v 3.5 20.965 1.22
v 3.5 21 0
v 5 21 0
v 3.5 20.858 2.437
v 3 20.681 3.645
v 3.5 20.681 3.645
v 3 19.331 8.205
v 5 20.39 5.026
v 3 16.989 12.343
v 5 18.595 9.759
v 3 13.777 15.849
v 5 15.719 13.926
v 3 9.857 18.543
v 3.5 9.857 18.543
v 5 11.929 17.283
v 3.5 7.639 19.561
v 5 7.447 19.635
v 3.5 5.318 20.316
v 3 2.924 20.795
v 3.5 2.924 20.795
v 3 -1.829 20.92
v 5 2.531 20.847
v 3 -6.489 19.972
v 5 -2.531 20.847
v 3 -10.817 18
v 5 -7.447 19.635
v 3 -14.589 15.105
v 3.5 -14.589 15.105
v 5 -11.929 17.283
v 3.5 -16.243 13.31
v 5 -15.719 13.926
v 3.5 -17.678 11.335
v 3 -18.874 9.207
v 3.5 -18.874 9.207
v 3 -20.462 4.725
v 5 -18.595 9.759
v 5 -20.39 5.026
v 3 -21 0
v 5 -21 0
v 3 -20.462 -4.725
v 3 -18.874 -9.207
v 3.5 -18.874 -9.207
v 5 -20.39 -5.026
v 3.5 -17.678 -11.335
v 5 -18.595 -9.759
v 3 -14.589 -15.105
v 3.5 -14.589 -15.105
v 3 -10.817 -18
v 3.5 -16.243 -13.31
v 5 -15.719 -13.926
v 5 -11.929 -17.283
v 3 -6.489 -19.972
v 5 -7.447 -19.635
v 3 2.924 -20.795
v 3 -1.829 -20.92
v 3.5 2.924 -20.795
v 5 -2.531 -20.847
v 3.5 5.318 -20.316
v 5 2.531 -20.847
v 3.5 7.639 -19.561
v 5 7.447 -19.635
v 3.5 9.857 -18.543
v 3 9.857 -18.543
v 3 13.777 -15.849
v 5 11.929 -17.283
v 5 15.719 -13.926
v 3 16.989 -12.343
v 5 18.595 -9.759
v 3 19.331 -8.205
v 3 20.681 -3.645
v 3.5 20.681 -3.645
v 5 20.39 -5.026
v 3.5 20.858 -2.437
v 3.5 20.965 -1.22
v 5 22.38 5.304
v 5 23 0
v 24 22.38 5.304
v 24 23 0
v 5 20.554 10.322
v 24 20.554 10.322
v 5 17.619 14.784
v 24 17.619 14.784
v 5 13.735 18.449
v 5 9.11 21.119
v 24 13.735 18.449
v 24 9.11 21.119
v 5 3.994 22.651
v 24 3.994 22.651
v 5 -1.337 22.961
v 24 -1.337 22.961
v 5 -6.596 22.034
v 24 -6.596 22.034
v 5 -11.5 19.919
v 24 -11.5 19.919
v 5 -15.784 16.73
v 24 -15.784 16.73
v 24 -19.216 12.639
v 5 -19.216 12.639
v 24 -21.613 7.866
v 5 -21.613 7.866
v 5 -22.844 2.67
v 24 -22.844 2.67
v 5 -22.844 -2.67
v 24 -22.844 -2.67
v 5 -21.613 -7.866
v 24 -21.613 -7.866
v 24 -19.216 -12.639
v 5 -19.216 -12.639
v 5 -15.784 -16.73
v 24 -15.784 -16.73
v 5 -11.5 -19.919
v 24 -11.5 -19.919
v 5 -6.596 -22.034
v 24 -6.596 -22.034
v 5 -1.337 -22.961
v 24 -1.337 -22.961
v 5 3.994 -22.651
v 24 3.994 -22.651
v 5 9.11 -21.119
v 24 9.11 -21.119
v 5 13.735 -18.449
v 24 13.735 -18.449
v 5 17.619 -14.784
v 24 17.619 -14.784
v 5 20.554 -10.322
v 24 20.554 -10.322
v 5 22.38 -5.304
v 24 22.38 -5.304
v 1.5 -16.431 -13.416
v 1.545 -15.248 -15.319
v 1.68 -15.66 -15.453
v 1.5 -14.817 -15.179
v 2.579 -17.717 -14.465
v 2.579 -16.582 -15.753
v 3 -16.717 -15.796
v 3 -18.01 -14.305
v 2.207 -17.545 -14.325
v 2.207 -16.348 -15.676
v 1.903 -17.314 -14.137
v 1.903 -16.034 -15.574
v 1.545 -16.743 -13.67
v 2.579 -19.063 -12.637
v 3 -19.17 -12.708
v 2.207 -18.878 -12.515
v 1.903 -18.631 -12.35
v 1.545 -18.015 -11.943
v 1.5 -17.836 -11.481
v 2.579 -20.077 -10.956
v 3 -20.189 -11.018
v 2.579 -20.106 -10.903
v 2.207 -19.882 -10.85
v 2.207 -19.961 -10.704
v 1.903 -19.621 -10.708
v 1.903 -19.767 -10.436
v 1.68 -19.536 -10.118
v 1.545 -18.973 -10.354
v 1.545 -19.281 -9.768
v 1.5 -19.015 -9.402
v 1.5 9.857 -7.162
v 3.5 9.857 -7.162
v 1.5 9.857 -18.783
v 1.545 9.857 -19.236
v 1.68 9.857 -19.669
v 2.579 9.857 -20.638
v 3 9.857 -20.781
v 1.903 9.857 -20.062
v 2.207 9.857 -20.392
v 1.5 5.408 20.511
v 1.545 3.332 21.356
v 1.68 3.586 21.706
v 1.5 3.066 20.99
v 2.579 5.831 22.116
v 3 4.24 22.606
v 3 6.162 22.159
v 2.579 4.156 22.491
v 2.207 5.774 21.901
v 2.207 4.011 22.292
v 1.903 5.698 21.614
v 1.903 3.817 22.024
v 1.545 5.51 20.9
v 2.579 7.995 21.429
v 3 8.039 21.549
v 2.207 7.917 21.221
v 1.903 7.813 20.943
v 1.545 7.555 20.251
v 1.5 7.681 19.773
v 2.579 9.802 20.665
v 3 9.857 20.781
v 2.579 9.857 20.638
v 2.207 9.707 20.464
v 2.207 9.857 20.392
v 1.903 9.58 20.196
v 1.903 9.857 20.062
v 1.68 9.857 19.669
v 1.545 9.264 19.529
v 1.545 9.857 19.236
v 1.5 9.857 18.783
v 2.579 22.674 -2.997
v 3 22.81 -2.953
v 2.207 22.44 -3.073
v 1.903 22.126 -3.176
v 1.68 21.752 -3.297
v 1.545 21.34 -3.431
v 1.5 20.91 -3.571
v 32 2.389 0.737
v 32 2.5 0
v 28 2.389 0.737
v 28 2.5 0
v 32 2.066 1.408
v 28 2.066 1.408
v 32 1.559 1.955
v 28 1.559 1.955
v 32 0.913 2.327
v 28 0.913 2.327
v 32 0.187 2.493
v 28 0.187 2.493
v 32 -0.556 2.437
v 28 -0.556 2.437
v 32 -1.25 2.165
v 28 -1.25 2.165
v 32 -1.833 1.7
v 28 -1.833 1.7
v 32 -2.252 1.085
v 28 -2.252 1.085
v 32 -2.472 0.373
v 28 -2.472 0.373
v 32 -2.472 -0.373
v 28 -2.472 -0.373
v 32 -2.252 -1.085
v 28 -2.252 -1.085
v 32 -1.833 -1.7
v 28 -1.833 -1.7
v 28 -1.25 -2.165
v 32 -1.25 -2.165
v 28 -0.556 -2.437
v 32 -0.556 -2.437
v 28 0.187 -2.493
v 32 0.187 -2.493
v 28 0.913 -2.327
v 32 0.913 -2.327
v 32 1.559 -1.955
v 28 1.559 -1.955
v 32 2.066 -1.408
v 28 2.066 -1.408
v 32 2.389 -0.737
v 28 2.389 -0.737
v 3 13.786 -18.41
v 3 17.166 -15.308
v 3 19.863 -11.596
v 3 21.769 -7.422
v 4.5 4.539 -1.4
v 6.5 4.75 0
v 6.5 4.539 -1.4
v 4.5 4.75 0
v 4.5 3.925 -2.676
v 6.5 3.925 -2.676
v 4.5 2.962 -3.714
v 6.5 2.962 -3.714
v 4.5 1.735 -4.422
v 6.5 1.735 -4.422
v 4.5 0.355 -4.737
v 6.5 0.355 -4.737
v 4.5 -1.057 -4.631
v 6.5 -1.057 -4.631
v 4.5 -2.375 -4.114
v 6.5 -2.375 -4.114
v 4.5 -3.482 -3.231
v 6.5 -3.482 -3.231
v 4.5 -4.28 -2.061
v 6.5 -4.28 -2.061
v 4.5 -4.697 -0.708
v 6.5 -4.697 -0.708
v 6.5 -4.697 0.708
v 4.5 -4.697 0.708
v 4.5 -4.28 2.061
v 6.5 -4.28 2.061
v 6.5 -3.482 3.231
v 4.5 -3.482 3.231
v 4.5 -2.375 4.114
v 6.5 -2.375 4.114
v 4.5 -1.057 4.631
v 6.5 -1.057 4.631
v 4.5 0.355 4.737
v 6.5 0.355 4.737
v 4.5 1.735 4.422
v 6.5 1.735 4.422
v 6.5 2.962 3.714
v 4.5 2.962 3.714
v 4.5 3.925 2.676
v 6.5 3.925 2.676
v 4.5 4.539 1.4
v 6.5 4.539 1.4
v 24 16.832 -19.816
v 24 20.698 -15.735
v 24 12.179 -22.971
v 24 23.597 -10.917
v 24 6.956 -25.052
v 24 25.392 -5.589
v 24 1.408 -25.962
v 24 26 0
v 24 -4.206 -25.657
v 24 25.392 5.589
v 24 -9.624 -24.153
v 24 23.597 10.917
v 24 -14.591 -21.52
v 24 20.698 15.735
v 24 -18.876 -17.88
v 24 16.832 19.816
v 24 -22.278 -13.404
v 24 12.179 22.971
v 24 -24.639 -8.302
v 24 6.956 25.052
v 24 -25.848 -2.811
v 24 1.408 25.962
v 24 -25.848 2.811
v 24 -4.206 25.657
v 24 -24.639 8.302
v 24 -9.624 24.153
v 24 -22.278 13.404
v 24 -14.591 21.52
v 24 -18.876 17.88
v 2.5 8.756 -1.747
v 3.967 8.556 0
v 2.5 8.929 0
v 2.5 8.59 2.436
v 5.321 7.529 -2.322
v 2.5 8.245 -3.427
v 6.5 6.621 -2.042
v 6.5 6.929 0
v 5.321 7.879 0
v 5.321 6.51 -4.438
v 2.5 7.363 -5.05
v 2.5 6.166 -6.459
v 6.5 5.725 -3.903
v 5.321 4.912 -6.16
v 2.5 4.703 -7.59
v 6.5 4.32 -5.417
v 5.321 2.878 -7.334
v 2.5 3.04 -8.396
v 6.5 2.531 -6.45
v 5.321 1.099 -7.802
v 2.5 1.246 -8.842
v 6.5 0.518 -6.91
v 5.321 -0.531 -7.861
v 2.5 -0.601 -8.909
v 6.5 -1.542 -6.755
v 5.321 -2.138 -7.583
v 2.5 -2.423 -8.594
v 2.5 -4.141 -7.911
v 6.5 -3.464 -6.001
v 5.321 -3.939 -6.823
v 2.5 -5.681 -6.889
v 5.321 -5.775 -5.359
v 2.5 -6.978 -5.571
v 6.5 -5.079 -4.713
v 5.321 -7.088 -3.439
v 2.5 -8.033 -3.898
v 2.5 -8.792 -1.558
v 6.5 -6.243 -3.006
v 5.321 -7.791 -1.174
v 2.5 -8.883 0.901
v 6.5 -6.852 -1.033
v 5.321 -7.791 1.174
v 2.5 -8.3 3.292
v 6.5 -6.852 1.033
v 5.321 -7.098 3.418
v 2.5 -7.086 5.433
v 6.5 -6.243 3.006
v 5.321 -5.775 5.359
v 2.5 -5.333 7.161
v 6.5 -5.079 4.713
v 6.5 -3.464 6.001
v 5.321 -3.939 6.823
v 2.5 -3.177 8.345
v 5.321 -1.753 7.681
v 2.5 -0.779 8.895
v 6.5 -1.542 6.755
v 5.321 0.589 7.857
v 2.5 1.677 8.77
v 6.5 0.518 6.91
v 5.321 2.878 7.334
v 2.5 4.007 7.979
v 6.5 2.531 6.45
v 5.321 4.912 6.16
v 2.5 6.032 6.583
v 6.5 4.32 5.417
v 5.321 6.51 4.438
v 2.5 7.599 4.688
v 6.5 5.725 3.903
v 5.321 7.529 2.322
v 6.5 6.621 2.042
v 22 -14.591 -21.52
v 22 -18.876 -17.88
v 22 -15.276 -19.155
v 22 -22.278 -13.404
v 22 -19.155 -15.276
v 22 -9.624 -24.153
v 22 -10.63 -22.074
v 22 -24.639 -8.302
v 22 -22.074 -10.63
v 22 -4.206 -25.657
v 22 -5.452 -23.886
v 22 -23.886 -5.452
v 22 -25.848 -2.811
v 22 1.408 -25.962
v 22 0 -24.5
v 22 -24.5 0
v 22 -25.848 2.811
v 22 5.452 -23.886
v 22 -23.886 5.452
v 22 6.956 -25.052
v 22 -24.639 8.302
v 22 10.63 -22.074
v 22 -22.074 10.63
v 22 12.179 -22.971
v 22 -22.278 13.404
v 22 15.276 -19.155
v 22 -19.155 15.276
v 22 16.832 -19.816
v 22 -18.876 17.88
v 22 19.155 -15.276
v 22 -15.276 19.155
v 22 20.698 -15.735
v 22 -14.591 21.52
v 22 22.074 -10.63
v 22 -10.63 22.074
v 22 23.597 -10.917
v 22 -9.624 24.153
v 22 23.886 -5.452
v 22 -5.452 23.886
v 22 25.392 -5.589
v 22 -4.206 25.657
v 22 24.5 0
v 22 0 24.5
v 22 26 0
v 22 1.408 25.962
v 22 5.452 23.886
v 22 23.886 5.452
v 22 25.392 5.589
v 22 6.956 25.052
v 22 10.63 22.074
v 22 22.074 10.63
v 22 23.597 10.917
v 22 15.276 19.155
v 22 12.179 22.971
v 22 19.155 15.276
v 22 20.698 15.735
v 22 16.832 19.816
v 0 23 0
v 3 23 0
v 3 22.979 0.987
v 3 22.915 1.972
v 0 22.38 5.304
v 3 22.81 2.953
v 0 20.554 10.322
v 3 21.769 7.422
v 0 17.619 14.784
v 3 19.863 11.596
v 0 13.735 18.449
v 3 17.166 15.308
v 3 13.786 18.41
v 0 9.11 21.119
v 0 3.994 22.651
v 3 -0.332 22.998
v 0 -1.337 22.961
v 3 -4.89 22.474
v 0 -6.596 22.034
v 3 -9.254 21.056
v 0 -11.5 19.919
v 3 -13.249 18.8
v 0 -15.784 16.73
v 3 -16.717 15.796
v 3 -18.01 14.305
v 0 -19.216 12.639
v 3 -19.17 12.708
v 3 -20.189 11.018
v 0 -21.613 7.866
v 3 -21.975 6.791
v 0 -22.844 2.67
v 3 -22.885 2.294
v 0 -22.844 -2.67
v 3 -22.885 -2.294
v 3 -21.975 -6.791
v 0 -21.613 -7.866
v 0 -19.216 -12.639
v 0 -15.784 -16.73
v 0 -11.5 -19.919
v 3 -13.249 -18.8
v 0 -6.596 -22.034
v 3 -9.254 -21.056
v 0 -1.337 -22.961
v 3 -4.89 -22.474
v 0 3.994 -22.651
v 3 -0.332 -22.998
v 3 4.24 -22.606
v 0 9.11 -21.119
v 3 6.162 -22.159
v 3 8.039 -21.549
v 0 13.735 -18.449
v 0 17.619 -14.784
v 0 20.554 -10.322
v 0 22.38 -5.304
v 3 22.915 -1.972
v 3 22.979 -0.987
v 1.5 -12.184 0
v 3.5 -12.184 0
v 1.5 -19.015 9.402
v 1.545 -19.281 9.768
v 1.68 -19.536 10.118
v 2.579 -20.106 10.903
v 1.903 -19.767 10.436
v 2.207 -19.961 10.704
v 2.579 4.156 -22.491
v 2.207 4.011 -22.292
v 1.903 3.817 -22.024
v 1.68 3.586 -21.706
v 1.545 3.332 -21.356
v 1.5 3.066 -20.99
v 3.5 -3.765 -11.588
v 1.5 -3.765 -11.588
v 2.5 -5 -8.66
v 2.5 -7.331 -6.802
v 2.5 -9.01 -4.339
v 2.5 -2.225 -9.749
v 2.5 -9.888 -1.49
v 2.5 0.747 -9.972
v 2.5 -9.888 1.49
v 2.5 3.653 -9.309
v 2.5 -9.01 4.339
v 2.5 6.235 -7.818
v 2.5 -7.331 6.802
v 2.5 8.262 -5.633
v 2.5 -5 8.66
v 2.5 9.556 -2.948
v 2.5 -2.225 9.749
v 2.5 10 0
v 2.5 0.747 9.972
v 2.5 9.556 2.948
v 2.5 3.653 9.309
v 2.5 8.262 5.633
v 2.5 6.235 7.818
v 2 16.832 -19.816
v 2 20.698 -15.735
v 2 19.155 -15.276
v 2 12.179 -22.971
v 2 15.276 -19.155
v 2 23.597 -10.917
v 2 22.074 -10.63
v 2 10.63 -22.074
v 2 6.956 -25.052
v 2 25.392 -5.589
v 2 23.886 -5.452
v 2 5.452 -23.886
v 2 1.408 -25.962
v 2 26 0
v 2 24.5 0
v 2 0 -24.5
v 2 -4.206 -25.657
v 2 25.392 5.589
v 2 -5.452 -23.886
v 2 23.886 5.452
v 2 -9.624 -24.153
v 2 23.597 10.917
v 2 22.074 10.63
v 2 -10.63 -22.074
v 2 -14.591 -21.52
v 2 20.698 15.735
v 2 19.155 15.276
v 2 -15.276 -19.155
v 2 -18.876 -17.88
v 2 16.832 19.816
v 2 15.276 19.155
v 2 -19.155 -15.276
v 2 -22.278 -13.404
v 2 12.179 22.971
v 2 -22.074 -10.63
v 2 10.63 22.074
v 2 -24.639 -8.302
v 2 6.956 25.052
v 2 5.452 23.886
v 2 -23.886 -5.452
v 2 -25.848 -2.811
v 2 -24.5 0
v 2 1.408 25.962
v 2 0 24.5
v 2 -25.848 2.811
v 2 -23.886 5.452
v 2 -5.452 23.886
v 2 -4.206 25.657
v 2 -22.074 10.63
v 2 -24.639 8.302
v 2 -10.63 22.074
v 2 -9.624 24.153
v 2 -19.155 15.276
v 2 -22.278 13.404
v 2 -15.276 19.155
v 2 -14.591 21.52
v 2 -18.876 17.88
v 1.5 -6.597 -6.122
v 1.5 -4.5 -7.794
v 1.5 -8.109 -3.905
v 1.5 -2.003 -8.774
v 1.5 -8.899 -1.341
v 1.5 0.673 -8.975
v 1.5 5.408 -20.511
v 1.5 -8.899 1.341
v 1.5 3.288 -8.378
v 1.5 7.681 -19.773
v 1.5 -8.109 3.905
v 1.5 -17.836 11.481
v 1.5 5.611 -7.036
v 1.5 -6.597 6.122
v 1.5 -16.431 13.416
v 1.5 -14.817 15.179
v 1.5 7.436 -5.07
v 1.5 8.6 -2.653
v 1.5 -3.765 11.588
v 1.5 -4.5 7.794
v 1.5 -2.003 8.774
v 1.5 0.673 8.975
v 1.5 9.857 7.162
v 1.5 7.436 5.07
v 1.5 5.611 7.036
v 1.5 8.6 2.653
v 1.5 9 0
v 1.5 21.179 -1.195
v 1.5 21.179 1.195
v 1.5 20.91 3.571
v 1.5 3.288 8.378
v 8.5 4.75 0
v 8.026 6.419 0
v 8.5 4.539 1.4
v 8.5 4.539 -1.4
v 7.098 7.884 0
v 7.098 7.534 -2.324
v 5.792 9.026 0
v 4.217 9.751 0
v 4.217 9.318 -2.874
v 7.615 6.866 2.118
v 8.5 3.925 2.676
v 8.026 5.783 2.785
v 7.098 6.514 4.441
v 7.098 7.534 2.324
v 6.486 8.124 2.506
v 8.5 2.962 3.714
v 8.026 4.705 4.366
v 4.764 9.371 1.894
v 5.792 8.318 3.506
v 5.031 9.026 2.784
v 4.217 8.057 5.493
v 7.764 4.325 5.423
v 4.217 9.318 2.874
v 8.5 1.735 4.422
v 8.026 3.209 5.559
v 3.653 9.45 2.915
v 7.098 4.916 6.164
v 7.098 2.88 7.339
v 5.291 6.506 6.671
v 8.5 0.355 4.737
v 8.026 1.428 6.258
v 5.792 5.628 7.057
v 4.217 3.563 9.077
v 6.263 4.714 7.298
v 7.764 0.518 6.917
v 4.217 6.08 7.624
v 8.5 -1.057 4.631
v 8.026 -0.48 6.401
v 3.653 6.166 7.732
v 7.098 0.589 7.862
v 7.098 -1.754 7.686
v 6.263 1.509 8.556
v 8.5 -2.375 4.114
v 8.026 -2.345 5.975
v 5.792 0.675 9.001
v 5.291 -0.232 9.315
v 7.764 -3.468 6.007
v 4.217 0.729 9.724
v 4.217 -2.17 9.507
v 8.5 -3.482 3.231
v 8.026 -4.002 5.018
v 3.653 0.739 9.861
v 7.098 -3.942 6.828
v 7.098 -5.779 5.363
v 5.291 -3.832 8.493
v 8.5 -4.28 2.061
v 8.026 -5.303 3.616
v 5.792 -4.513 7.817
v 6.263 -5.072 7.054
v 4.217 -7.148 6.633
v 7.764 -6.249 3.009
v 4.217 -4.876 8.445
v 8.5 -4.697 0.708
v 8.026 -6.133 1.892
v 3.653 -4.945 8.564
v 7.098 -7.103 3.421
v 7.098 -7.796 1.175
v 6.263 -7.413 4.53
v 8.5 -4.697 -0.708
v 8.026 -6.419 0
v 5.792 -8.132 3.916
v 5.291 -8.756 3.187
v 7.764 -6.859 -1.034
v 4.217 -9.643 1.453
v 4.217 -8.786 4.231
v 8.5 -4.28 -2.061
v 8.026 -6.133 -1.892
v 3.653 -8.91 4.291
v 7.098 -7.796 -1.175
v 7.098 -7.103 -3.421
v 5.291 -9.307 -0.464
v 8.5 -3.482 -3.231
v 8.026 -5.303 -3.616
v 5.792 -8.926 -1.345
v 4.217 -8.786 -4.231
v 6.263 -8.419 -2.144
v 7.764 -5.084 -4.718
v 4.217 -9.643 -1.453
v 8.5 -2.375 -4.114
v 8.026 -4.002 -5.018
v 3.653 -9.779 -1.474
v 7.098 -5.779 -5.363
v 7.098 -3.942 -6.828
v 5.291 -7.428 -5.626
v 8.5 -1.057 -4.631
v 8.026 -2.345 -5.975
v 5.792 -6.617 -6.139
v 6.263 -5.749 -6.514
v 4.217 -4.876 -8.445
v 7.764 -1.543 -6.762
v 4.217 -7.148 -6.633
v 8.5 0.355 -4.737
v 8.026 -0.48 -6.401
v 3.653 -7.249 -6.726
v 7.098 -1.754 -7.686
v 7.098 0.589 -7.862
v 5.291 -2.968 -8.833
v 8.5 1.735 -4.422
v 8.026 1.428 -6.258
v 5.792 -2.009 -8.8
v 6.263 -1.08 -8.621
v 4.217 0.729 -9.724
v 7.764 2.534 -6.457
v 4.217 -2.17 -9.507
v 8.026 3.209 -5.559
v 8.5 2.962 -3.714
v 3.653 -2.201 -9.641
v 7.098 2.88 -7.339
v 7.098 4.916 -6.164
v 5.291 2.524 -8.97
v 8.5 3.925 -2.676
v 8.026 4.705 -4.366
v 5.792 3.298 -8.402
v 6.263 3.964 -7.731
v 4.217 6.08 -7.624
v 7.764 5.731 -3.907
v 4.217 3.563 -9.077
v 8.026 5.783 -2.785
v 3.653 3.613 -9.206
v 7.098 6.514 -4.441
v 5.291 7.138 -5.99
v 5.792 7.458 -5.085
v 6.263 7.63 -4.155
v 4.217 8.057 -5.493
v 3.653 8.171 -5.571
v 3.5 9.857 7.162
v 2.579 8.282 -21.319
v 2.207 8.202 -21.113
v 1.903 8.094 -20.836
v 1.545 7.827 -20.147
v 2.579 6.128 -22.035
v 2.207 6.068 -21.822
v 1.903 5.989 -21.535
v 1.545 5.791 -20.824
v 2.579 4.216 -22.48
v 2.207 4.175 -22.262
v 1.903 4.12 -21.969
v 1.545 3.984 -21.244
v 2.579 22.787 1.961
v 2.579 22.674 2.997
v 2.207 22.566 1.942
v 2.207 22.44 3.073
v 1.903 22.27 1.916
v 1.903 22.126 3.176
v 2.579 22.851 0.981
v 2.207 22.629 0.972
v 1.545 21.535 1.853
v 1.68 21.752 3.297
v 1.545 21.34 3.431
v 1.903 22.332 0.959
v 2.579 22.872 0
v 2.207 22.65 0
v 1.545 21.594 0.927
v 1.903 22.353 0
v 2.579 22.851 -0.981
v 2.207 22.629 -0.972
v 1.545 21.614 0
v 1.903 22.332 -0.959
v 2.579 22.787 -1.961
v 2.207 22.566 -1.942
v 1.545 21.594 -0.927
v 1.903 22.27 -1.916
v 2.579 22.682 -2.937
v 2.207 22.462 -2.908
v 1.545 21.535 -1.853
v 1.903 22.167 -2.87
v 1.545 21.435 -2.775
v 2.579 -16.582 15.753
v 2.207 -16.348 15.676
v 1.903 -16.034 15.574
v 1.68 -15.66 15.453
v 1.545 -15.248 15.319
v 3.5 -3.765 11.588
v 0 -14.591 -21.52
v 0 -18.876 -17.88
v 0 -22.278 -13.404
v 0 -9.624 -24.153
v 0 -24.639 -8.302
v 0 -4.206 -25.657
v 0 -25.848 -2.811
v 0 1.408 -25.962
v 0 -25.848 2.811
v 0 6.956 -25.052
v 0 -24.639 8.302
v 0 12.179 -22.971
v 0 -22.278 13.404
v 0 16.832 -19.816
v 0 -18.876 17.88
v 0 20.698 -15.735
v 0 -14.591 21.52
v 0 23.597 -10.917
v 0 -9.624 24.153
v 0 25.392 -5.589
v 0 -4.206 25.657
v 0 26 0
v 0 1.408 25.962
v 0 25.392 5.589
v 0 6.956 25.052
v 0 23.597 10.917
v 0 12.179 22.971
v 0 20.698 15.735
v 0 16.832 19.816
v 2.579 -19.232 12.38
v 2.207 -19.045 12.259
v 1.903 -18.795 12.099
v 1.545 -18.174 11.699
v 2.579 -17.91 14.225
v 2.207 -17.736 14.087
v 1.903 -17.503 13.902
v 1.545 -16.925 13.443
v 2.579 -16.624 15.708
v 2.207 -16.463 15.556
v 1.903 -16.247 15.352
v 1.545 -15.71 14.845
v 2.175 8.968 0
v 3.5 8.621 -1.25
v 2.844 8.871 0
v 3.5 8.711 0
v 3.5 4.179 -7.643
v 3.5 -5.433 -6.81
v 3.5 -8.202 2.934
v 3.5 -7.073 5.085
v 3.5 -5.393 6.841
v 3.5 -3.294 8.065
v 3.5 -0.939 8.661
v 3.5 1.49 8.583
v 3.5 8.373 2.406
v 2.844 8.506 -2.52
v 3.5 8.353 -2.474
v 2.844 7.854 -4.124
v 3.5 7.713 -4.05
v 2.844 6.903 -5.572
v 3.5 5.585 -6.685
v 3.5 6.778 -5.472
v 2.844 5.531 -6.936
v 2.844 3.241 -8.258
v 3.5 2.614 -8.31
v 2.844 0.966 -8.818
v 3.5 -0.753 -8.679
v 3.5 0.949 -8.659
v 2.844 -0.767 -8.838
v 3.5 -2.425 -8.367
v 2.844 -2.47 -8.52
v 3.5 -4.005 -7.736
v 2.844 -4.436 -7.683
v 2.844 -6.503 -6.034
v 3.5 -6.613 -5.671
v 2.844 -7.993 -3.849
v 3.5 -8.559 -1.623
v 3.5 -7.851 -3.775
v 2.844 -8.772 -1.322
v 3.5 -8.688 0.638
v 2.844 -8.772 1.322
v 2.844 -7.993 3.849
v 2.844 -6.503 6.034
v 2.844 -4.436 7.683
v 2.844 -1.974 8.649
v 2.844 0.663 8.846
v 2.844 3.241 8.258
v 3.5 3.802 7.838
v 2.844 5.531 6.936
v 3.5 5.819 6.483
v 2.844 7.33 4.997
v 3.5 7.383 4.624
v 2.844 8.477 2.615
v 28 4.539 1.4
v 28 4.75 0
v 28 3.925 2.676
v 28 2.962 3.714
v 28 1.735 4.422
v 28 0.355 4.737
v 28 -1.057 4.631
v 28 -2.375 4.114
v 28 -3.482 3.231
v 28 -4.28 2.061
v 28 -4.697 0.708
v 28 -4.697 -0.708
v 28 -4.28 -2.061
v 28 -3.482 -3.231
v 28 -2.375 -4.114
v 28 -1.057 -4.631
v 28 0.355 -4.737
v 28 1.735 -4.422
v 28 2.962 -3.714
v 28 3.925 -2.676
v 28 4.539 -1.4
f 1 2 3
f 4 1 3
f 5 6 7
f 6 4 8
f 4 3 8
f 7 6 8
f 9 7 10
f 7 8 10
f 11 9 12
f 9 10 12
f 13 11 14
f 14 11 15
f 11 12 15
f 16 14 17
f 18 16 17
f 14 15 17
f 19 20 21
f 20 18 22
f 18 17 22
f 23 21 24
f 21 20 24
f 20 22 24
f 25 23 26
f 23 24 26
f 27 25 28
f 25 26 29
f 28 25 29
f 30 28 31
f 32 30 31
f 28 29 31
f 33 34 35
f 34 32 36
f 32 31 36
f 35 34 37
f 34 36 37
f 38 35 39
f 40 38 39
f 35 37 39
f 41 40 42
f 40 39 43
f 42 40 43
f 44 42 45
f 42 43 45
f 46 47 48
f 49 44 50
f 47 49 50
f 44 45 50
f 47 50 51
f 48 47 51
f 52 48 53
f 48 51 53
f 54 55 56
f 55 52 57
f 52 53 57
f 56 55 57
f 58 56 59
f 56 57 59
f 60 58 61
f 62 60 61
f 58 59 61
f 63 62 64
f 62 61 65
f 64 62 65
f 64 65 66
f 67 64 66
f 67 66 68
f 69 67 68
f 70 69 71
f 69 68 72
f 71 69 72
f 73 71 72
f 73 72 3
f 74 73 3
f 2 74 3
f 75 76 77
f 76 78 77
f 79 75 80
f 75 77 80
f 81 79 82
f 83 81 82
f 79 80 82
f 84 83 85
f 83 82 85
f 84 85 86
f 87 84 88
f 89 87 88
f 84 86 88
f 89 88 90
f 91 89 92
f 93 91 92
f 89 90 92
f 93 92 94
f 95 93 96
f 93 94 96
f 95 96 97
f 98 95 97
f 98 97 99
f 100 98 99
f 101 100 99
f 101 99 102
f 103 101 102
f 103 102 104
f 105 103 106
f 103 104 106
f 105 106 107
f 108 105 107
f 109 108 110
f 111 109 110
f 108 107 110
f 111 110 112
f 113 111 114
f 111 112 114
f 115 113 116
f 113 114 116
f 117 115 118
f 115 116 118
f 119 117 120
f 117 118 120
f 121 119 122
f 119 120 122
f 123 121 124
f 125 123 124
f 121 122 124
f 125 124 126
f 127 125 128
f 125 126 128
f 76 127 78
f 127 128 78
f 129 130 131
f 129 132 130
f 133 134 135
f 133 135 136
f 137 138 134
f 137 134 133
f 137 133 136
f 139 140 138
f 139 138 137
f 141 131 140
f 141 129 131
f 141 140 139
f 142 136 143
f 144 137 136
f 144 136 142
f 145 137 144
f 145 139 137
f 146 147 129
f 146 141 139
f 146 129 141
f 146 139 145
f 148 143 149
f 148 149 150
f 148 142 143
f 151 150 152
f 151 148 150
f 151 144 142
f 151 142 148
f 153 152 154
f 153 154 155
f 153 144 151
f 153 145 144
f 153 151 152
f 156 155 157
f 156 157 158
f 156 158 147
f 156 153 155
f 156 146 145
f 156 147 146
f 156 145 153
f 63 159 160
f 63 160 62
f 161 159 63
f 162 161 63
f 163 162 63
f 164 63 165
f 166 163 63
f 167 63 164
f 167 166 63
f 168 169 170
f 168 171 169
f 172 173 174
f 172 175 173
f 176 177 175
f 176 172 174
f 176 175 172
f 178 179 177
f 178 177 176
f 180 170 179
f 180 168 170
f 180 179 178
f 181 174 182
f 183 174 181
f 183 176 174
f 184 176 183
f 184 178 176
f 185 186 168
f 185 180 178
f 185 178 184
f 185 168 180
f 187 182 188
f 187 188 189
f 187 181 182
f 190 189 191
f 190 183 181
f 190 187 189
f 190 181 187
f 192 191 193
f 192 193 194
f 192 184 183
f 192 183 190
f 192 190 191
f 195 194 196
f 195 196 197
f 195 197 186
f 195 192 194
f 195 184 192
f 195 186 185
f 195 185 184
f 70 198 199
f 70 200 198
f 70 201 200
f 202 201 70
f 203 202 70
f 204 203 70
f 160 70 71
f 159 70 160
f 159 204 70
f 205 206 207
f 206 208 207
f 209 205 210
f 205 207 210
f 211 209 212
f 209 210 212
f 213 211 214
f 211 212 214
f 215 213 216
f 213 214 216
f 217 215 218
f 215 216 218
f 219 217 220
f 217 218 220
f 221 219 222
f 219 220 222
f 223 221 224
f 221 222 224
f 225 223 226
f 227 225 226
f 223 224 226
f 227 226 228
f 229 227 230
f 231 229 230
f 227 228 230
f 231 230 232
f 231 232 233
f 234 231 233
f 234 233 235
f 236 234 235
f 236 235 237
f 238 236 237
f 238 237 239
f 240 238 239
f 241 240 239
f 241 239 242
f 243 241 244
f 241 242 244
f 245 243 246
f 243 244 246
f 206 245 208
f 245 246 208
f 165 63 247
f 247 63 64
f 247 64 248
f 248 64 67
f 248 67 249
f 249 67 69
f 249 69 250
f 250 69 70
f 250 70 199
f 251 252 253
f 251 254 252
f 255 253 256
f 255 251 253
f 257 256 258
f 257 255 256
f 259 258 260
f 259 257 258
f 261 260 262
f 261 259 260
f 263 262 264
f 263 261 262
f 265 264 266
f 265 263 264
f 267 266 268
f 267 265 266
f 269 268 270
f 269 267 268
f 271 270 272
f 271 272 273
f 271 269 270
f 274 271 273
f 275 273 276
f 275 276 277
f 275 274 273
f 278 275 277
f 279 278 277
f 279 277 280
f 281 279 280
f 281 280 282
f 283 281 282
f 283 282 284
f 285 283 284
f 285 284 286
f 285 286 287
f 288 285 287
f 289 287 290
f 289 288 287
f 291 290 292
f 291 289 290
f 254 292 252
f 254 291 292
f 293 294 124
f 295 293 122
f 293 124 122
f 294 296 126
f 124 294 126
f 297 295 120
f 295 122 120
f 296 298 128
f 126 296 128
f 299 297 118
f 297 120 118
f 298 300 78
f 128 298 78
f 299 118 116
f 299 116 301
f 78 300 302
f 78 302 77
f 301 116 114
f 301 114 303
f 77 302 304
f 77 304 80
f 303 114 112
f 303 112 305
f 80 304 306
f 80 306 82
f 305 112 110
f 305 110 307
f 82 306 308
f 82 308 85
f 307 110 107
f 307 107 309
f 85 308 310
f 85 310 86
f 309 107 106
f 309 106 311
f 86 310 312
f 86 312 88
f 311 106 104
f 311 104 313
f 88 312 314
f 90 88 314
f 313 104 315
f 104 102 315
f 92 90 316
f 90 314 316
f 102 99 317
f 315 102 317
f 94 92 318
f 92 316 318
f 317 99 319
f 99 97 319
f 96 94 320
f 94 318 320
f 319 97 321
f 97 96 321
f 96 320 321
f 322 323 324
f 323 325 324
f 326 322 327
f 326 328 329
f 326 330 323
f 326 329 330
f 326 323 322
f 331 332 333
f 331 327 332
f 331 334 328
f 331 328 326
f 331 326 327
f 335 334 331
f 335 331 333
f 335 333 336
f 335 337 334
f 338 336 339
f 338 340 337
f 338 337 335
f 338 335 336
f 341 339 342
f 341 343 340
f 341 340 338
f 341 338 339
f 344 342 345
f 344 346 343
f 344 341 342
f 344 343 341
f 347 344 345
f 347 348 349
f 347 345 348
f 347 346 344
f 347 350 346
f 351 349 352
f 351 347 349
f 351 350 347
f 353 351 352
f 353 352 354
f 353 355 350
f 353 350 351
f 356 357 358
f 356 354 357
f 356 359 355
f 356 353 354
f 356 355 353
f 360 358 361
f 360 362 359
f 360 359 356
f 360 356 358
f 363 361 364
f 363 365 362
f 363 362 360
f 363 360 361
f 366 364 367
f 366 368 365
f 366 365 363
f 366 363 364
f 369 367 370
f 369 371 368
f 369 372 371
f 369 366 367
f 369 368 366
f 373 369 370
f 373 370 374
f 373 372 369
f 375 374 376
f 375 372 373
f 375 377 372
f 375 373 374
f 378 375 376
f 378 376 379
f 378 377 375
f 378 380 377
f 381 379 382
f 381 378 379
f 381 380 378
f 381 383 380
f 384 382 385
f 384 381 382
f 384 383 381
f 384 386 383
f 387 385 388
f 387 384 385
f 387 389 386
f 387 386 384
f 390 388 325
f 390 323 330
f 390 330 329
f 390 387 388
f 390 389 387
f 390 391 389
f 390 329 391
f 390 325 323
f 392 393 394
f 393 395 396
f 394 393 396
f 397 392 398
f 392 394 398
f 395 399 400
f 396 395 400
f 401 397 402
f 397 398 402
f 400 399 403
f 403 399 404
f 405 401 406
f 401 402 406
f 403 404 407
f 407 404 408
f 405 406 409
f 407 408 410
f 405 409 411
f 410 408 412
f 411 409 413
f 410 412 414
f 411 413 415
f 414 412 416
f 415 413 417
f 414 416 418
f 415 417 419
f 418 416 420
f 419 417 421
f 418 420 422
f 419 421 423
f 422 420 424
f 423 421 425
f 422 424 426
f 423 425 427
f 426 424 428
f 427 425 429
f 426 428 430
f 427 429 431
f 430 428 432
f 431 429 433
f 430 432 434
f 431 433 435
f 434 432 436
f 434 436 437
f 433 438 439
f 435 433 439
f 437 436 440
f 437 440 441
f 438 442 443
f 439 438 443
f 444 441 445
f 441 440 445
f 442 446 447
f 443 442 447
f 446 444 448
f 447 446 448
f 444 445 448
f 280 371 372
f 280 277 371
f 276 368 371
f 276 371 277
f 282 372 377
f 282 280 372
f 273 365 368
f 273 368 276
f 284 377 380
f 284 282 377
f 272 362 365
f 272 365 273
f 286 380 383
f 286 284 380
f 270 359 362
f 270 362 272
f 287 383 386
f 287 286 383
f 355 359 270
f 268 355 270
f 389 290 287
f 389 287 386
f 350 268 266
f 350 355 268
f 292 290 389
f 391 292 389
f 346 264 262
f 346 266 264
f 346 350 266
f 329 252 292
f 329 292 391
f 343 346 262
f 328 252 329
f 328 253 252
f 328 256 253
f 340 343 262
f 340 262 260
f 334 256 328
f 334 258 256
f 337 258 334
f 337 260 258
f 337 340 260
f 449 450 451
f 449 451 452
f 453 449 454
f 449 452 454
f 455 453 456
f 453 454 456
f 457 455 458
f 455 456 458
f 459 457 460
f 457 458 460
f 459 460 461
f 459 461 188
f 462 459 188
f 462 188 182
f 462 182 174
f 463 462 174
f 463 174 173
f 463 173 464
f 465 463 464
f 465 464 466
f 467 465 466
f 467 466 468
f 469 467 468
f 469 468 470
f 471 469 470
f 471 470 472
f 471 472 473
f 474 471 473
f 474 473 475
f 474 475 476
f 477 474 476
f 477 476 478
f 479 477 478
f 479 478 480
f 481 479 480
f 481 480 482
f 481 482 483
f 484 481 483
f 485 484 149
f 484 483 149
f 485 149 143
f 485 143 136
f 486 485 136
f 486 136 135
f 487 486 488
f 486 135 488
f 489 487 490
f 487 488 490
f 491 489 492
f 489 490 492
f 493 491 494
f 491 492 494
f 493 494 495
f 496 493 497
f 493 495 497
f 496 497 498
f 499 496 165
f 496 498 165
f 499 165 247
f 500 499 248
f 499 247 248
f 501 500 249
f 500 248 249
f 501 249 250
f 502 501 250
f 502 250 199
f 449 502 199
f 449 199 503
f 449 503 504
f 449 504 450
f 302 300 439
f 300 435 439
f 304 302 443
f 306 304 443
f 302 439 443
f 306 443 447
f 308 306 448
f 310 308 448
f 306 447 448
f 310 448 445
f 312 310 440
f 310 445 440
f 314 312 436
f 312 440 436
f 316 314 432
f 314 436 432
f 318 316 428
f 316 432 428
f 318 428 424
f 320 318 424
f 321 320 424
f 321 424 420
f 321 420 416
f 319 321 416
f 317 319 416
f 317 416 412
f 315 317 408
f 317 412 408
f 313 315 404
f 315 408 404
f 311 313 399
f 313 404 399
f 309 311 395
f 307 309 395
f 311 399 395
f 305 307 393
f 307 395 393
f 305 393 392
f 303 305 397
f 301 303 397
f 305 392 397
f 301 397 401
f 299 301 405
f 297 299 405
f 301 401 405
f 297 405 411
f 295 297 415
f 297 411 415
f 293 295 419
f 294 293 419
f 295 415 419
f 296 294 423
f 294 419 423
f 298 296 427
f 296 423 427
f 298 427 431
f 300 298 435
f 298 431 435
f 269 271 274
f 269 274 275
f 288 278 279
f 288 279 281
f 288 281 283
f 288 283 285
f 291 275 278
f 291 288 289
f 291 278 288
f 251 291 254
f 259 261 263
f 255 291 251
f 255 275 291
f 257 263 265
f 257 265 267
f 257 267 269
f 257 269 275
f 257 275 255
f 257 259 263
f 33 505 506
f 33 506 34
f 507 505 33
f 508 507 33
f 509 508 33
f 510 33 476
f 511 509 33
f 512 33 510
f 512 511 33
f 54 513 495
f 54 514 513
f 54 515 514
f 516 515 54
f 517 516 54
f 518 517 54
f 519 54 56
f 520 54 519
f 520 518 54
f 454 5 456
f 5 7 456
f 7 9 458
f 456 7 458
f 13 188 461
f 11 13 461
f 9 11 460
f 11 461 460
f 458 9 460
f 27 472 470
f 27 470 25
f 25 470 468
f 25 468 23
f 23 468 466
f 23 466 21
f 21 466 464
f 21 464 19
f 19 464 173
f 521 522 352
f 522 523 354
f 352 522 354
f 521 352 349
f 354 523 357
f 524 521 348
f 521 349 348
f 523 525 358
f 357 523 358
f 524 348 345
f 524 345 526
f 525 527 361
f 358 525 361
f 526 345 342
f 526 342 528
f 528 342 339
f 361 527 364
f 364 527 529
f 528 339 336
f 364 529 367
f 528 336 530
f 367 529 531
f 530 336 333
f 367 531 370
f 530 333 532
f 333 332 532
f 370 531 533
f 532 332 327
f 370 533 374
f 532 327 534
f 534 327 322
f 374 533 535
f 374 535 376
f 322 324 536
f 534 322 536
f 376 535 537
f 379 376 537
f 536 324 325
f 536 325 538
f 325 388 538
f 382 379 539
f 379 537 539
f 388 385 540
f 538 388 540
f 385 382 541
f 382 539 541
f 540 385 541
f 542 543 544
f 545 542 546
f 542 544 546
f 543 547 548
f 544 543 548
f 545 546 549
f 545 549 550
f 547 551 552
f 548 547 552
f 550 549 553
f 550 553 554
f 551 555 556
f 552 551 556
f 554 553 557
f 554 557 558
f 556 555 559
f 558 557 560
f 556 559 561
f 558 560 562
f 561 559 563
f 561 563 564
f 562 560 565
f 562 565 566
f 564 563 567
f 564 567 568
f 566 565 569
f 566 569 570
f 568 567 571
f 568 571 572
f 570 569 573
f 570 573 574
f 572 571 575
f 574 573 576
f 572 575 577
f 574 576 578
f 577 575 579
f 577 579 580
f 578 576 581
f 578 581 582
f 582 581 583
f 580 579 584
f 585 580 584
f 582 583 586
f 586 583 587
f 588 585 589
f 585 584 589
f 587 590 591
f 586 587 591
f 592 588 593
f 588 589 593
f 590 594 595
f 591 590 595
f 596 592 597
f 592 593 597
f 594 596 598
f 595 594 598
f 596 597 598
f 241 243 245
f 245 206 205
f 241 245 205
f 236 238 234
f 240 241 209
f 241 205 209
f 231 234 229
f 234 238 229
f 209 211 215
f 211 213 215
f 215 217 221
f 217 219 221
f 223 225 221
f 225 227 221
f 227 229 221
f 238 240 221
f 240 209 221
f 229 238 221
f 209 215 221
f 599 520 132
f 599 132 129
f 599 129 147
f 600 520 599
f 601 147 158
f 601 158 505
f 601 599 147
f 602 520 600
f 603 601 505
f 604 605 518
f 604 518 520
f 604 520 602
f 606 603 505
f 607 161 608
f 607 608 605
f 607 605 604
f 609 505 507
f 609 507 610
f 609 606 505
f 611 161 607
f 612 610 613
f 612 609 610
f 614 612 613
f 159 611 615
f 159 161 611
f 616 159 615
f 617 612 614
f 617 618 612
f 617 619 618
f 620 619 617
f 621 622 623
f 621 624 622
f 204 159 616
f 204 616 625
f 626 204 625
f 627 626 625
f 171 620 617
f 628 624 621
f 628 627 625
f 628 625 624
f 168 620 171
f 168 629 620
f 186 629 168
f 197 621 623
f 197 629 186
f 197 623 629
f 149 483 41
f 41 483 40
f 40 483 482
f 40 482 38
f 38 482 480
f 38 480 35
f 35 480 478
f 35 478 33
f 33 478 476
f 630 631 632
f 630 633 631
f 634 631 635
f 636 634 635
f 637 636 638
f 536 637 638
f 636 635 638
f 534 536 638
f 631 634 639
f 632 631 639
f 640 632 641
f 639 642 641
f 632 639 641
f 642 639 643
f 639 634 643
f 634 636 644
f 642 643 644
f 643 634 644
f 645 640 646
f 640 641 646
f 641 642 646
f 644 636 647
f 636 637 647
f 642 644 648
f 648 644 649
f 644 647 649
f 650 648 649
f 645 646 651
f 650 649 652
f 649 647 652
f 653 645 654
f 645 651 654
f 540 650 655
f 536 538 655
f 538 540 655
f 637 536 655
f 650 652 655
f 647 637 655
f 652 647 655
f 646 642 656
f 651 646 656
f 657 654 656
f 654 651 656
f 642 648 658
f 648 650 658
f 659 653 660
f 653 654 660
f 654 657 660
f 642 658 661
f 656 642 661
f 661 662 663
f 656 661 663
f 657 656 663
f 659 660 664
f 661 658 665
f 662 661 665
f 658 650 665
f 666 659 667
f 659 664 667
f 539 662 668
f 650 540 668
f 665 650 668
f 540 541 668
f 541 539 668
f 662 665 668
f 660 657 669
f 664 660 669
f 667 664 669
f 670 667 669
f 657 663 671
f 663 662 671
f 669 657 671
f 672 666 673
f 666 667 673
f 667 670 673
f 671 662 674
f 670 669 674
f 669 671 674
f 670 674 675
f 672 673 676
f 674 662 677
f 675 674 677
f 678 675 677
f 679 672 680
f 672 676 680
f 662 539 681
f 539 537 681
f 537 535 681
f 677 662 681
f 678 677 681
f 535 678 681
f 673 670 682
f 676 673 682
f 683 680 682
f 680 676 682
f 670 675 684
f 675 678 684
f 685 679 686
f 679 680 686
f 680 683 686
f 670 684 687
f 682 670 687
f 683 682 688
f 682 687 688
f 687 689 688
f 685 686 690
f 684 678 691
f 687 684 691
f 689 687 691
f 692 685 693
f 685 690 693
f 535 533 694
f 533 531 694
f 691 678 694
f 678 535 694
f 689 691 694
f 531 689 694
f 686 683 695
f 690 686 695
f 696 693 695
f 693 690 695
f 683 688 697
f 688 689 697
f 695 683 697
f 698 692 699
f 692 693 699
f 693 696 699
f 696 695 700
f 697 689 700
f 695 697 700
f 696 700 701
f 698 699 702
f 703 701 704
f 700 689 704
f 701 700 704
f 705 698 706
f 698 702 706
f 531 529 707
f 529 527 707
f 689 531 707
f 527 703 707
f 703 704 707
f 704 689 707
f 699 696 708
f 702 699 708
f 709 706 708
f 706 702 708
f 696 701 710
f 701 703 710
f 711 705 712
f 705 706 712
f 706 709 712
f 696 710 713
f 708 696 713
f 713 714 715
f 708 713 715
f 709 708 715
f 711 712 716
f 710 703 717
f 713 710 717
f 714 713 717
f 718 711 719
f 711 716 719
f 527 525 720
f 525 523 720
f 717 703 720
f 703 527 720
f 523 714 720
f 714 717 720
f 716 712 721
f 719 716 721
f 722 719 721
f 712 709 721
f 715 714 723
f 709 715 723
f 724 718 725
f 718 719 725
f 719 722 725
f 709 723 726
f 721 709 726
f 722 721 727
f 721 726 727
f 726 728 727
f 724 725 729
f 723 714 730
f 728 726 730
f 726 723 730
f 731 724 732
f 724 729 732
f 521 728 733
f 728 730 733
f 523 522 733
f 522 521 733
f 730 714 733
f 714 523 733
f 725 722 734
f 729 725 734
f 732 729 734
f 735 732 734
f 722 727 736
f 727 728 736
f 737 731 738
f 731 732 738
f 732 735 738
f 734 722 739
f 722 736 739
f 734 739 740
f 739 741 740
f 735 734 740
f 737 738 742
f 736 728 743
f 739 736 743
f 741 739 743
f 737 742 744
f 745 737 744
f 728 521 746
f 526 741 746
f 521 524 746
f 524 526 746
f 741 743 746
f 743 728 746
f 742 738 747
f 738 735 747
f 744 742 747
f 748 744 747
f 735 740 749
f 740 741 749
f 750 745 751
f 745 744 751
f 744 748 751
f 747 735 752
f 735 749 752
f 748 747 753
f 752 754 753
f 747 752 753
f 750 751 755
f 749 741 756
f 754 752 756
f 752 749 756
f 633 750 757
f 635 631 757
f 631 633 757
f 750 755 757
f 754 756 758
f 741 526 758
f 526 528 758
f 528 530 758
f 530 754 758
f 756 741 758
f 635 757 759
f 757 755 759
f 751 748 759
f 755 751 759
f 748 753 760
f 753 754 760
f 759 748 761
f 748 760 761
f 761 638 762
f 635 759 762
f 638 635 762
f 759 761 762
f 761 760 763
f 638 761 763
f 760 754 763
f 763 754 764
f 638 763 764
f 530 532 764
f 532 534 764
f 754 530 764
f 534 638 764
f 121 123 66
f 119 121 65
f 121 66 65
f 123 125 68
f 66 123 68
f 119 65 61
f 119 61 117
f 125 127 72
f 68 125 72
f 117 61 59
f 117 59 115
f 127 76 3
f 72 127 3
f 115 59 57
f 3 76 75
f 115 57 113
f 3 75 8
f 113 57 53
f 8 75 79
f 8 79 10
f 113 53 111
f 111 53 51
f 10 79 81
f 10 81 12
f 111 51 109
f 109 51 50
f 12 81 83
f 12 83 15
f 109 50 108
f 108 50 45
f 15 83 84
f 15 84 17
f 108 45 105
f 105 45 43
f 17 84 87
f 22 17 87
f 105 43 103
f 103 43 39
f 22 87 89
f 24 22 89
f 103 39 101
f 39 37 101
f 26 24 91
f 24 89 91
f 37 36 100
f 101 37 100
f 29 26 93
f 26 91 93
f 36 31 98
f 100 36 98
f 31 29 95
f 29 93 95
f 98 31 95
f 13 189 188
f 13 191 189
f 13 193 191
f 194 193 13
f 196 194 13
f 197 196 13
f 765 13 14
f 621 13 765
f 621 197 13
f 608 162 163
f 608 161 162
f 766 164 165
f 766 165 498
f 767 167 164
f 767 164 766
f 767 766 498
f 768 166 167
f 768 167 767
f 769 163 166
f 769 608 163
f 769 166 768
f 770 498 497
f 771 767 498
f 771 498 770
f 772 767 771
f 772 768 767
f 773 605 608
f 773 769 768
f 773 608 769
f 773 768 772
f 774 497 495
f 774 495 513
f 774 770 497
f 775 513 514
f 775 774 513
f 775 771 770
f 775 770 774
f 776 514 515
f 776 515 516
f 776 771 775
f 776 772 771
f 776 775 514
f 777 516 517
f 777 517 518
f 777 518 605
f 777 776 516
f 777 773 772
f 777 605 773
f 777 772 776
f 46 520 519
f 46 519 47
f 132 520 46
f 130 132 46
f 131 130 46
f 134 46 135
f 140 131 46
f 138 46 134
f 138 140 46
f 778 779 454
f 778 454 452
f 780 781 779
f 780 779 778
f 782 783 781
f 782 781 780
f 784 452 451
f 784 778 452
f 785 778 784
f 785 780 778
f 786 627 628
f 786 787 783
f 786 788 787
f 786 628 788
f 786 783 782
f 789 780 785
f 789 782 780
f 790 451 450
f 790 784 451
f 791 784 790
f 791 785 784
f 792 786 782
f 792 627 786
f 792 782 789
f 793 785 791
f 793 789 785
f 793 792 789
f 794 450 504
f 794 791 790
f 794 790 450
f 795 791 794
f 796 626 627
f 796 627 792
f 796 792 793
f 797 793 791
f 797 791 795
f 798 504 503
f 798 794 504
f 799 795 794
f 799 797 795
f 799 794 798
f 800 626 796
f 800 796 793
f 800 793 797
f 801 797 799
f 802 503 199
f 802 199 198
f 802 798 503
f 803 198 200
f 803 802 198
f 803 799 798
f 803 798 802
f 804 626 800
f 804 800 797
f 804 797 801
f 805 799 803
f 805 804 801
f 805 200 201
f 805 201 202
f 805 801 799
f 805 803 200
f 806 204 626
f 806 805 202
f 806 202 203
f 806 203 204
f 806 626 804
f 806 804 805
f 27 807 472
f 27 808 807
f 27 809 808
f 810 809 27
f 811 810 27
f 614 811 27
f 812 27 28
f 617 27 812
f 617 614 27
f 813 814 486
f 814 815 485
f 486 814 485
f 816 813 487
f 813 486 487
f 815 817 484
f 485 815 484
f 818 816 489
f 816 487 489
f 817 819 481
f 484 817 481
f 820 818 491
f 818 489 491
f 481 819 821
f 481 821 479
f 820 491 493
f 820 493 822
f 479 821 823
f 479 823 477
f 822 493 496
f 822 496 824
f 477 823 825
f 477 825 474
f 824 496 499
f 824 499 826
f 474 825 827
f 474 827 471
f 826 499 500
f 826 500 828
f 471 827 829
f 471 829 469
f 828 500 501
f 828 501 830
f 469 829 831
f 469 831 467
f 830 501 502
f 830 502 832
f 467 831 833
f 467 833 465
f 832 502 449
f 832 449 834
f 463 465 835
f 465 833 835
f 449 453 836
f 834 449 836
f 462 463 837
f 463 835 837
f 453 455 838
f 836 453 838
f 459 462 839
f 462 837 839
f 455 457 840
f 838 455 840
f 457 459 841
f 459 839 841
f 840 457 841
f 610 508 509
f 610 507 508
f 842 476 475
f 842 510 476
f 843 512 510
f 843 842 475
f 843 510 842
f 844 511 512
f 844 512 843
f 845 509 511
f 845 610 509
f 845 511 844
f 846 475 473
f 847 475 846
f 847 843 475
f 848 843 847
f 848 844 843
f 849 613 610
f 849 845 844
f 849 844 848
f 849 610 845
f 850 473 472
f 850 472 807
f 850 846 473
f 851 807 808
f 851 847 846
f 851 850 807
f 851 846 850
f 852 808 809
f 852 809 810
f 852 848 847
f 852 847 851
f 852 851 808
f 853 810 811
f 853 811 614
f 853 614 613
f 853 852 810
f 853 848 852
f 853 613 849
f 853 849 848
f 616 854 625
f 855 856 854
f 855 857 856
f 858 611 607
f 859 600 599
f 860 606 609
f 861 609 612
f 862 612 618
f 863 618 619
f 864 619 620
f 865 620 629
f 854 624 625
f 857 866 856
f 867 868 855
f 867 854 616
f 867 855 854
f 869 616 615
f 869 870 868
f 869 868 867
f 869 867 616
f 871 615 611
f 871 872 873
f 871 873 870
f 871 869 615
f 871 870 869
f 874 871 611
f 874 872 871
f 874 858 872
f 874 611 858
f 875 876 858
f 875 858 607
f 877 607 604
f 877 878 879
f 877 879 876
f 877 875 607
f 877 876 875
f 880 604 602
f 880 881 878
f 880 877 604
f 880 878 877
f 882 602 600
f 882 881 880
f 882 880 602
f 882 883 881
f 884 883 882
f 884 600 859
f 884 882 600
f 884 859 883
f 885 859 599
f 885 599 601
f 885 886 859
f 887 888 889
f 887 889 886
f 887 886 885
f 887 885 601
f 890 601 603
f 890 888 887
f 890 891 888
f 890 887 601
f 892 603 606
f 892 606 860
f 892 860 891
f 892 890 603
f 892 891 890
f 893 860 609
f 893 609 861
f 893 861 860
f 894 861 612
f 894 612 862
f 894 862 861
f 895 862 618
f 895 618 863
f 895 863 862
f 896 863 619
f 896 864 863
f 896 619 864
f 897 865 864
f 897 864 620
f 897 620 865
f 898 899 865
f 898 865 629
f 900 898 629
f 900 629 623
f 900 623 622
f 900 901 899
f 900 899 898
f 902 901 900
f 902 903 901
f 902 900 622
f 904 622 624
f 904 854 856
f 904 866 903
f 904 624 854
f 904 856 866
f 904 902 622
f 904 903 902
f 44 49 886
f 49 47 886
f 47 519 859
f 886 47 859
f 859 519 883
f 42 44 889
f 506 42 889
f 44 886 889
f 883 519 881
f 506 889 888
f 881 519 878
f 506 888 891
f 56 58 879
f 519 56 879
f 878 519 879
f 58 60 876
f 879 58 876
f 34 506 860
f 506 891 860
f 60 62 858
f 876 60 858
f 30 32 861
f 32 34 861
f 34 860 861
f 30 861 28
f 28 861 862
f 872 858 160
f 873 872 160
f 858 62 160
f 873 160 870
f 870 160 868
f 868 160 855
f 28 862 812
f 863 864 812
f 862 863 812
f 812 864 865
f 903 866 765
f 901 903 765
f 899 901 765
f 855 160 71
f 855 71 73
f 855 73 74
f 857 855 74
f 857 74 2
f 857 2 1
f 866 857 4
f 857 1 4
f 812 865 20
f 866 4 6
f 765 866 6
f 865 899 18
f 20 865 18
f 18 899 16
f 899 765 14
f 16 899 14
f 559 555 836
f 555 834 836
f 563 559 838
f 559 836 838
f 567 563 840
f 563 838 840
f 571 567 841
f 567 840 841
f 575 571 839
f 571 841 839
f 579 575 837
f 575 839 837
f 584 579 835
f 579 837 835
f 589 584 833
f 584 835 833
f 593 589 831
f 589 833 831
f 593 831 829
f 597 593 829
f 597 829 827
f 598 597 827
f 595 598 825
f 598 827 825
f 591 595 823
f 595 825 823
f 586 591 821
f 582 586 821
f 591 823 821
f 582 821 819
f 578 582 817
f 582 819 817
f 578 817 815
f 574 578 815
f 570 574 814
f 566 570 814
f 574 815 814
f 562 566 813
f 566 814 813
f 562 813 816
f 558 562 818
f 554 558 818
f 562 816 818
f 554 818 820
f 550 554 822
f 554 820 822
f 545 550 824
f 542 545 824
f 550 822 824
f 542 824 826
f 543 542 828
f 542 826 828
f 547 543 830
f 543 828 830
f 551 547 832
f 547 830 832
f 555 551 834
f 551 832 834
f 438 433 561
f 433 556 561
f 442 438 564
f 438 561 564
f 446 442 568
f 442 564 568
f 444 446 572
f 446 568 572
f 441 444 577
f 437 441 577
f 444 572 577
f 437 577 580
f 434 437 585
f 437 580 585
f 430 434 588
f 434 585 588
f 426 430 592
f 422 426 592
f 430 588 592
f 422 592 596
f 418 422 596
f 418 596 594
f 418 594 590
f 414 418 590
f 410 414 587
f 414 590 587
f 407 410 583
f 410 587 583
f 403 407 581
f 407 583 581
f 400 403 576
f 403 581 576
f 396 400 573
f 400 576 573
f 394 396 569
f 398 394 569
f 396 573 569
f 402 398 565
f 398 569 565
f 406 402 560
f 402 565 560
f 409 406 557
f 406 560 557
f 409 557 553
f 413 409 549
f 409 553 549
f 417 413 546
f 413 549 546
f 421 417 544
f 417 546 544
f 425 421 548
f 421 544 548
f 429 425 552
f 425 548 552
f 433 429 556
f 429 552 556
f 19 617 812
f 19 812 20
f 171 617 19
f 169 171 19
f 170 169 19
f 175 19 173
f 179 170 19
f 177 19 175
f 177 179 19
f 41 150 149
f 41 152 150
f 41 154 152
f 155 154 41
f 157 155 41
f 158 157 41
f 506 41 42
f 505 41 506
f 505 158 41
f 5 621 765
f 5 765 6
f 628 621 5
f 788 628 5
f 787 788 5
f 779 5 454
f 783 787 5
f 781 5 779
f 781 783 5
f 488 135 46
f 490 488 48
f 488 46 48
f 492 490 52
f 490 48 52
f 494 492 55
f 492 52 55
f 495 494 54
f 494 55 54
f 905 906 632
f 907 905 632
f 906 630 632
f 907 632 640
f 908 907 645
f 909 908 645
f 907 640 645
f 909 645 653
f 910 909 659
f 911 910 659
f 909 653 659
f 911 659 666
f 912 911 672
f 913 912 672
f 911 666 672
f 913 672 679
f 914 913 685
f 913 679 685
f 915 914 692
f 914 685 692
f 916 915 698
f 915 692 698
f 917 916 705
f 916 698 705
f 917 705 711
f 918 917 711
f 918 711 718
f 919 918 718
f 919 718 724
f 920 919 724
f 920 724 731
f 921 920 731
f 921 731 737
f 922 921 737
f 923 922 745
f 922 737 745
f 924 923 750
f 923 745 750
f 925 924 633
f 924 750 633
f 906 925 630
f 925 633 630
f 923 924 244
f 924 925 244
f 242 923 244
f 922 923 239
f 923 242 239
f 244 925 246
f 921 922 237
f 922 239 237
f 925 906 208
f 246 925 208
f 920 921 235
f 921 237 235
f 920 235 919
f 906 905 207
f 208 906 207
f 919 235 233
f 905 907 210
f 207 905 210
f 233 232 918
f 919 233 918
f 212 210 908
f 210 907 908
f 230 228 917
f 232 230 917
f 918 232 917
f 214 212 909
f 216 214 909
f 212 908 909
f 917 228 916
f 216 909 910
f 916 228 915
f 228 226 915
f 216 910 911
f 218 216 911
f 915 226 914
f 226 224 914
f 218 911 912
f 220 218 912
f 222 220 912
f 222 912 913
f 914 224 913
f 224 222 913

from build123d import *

# Parameters (mm, degrees)
RESSALTO_EXTRUS_O1_DEPTH = 2


with BuildPart() as part:
    # Esboço1 → Revolução1 (revolve)
    with BuildSketch(Plane.XY):
        Polygon((0, 26), (0, 23), (3, 23), (3, 21), (5, 21), (5, 23), (24, 23), (24, 26), (22, 26), (22, 24.5), (2, 24.5), (2, 26), align=None)
    revolve(axis=Axis((0, 0, 0), (1, 0, 0)))

    # Esboço2 → Ressalto-extrusão1 (add)
    with BuildSketch(Plane(origin=(1.5, 0, 0), x_dir=(0, 0, -1), z_dir=(1, 0, 0))):
        with BuildLine():
            Line((2.953388355, 22.80959222), (7.161813683, 9.857390871))
            Line((7.161813683, 9.857390871), (20.780564122, 9.857390871))
            ThreePointArc((20.780564122, 9.857390871), (21.874299875, 7.107390871), (22.605858507, 4.239712391))
            Line((22.605858507, 4.239712391), (11.58805796, -3.765188272))
            Line((11.58805796, -3.765188272), (15.796483288, -16.717389621))
            ThreePointArc((15.796483288, -16.717389621), (13.519060803, -18.607390871), (11.017800547, -20.18930586))
            Line((11.017800547, -20.18930586), (0, -12.184405197))
            Line((0, -12.184405197), (-11.017800547, -20.18930586))
            ThreePointArc((-11.017800547, -20.18930586), (-13.519060803, -18.607390871), (-15.796483288, -16.717389621))
            Line((-15.796483288, -16.717389621), (-11.58805796, -3.765188272))
            Line((-11.58805796, -3.765188272), (-22.605858507, 4.239712391))
            ThreePointArc((-22.605858507, 4.239712391), (-21.874299875, 7.107390871), (-20.780564122, 9.857390871))
            Line((-20.780564122, 9.857390871), (-7.161813683, 9.857390871))
            Line((-7.161813683, 9.857390871), (-2.953388355, 22.80959222))
            ThreePointArc((-2.953388355, 22.80959222), (0, 23), (2.953388355, 22.80959222))
        make_face()
    extrude(amount=RESSALTO_EXTRUS_O1_DEPTH)


with BuildPart() as body_2:
    # Esboço4 → Revolução2 (revolve)
    with BuildSketch(Plane.XY):
        with BuildLine():
            Line((28, 4.75), (8.5, 4.75))
            ThreePointArc((8.5, 4.75), (6.48630468, 8.502205348), (2.5, 10))
            Line((2.5, 10), (2.5, 0))
            Line((2.5, 0), (32, 0))
            Line((32, 0), (32, 2.5))
            Line((32, 2.5), (28, 2.5))
            Line((28, 2.5), (28, 4.75))
        make_face()
    revolve(axis=Axis((35.369555181, 0, 0), (1, 0, 0)))


with BuildPart() as corte_revolu_o1_tool:
    # Esboço3 → Corte-Revolução1 (revolve)
    with BuildSketch(Plane.XY):
        with BuildLine():
            Line((1.5, 21.212369611), (1.5, 23))
            Line((1.5, 23), (3, 23))
            ThreePointArc((3, 23), (1.924677874, 22.379162481), (1.5, 21.212369611))
        make_face()
        with BuildLine():
            Line((4.5, 4.75), (4.5, 0))
            Line((4.5, 0), (1.5, 0))
            Line((1.5, 0), (1.5, 9))
            ThreePointArc((1.5, 9), (4.205980501, 8.461747013), (6.5, 6.928932188))
            Line((6.5, 6.928932188), (6.5, 4.75))
            Line((6.5, 4.75), (4.5, 4.75))
        make_face()
    revolve(axis=Axis((0, 0, 0), (-1, 0, 0)))


with BuildPart() as part_1:
    add(part.part)

    # Corte-Revolução1: cut by corte_revolu_o1_tool
    add(corte_revolu_o1_tool.part, mode=Mode.SUBTRACT)


with BuildPart() as body_2_1:
    add(body_2.part)

    # Corte-Revolução1: cut by corte_revolu_o1_tool
    add(corte_revolu_o1_tool.part, mode=Mode.SUBTRACT)


solid = Compound([part_1.part, body_2_1.part])
